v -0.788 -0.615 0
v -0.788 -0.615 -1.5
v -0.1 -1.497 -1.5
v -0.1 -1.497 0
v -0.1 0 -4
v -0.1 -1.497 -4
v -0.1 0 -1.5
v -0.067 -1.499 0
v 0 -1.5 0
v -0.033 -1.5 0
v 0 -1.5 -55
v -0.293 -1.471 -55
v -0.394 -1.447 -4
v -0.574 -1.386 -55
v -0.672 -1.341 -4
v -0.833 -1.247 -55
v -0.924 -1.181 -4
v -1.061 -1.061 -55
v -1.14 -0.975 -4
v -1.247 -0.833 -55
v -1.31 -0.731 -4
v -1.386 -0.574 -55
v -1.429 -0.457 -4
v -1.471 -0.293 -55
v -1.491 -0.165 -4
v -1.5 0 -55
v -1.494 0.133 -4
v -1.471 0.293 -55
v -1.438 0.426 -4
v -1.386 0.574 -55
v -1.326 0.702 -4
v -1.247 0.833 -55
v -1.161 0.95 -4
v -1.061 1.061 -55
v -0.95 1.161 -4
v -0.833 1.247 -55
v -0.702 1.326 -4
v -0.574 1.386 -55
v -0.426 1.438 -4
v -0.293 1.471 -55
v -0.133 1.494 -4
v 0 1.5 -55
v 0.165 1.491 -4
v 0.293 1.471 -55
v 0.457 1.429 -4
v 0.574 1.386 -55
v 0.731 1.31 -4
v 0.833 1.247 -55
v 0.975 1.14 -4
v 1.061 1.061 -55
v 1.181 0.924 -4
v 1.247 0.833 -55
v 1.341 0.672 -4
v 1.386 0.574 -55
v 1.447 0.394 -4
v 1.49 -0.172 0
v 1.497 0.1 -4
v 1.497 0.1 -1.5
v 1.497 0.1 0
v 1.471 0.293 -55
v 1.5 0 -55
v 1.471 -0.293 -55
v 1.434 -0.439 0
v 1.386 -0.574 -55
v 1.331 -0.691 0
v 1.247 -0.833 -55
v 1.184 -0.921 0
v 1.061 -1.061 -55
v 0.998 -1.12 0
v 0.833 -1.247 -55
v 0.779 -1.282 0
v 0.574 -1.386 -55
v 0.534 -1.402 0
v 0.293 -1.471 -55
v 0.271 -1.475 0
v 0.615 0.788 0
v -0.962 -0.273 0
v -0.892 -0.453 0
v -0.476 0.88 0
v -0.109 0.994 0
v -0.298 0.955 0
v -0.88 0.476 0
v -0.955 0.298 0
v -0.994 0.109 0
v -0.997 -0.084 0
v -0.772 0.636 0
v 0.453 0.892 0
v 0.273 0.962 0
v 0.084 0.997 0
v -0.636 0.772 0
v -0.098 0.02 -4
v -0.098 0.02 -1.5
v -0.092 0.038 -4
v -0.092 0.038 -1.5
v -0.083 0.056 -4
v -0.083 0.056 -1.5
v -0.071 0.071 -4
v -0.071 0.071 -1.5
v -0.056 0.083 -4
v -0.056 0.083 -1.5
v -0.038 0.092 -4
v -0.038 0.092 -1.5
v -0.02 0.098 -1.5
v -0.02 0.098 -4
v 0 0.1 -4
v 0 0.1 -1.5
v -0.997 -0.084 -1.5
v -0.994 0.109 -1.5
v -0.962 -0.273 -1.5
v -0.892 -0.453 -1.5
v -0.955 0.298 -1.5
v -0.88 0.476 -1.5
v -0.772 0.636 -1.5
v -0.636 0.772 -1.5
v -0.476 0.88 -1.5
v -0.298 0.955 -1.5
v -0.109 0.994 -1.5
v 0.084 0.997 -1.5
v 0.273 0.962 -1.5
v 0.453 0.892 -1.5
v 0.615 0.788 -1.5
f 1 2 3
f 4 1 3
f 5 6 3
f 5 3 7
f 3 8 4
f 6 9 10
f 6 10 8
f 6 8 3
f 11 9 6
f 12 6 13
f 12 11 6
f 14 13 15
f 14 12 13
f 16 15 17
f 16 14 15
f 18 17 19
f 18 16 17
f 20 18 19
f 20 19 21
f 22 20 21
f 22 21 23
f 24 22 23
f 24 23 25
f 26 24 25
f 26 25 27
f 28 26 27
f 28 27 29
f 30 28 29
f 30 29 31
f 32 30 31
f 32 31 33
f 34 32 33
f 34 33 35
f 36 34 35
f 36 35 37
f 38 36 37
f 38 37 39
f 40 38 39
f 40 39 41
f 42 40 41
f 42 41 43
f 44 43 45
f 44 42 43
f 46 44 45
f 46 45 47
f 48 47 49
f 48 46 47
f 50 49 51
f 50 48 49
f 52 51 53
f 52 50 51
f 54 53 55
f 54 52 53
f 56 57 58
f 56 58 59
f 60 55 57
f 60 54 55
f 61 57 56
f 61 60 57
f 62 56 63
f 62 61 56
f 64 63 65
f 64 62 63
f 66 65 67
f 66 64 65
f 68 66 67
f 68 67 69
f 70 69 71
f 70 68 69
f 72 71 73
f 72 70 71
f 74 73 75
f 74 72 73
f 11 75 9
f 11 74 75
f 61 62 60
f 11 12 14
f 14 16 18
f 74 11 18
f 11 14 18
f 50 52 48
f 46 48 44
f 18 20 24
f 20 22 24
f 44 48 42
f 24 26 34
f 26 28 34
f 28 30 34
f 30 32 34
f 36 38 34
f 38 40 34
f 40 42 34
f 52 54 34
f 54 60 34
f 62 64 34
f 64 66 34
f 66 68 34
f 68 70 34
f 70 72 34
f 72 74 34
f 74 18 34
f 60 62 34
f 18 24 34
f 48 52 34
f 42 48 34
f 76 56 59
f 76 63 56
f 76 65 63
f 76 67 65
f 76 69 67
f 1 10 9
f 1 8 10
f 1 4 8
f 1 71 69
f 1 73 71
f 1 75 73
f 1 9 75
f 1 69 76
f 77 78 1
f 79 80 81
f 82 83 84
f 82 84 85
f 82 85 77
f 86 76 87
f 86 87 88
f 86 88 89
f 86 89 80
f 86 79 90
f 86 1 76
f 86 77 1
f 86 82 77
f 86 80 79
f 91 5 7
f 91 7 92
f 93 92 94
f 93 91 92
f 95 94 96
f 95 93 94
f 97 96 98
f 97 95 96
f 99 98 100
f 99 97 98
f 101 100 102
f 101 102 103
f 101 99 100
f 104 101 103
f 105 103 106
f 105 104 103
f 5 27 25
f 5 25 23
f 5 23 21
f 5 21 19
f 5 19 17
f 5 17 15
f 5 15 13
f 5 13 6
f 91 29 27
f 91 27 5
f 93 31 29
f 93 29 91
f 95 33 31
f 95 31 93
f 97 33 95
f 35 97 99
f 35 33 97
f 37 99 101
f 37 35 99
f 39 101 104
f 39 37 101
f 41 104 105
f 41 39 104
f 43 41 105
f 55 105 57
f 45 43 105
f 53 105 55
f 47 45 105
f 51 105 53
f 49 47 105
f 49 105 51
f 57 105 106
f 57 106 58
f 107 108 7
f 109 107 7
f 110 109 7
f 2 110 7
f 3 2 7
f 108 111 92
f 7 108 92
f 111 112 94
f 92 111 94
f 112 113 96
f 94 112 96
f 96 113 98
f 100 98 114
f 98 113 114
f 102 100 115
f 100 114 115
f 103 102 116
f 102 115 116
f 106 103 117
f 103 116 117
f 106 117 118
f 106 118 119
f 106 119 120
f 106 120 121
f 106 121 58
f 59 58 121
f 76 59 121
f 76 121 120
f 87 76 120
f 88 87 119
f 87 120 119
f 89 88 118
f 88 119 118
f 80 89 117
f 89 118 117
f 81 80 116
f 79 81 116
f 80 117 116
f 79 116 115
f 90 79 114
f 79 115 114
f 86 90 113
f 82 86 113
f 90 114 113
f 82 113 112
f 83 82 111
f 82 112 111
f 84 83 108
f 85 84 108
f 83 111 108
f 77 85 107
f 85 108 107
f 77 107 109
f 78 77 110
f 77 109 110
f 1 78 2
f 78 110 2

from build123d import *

# Parameters (mm, degrees)
SKETCH1_W          = 55
SKETCH1_H          = 1.5
CUT_EXTRUDE1_START = -4
CUT_EXTRUDE1_DEPTH = 2.5
CUT_EXTRUDE2_START = -1.5
CUT_EXTRUDE2_DEPTH = 1.5


with BuildPart() as part:
    # Sketch1 → Revolve1 (revolve)
    with BuildSketch(Plane(origin=(0, 0, 0), x_dir=(0, 0, -1), z_dir=(1, 0, 0)), mode=Mode.PRIVATE) as revolve1_sk:
        with Locations((27.5, 0.75)):
            Rectangle(SKETCH1_W, SKETCH1_H)
    revolve(revolve1_sk.sketch.rotate(Axis((0, 0, 9.840994653), (0, 0, -1)), 180), axis=Axis((0, 0, 9.840994653), (0, 0, -1)))

    # Sketch2 → Cut-Extrude1 (cut)
    with BuildSketch(Plane.XY.offset(CUT_EXTRUDE1_START)):
        with BuildLine():
            Line((0, 0.1), (1.496662955, 0.1))
            ThreePointArc((1.496662955, 0.1), (-1.060660172, 1.060660172), (-0.1, -1.496662955))
            Line((-0.1, -1.496662955), (-0.1, 0))
            ThreePointArc((-0.1, 0), (-0.070710678, 0.070710678), (0, 0.1))
        make_face()
    extrude(amount=CUT_EXTRUDE1_DEPTH, mode=Mode.SUBTRACT)

    # Sketch3 → Cut-Extrude2 (cut)
    with BuildSketch(Plane.XY.offset(CUT_EXTRUDE2_START)):
        with BuildLine():
            Line((1.496662955, 0.1), (0.615493136, 0.788142246))
            ThreePointArc((0.615493136, 0.788142246), (-0.707106781, 0.707106781), (-0.788142246, -0.615493136))
            Line((-0.788142246, -0.615493136), (-0.1, -1.496662955))
            ThreePointArc((-0.1, -1.496662955), (-1.060660172, 1.060660172), (1.496662955, 0.1))
        make_face()
    extrude(amount=CUT_EXTRUDE2_DEPTH, mode=Mode.SUBTRACT)


solid = part.part
